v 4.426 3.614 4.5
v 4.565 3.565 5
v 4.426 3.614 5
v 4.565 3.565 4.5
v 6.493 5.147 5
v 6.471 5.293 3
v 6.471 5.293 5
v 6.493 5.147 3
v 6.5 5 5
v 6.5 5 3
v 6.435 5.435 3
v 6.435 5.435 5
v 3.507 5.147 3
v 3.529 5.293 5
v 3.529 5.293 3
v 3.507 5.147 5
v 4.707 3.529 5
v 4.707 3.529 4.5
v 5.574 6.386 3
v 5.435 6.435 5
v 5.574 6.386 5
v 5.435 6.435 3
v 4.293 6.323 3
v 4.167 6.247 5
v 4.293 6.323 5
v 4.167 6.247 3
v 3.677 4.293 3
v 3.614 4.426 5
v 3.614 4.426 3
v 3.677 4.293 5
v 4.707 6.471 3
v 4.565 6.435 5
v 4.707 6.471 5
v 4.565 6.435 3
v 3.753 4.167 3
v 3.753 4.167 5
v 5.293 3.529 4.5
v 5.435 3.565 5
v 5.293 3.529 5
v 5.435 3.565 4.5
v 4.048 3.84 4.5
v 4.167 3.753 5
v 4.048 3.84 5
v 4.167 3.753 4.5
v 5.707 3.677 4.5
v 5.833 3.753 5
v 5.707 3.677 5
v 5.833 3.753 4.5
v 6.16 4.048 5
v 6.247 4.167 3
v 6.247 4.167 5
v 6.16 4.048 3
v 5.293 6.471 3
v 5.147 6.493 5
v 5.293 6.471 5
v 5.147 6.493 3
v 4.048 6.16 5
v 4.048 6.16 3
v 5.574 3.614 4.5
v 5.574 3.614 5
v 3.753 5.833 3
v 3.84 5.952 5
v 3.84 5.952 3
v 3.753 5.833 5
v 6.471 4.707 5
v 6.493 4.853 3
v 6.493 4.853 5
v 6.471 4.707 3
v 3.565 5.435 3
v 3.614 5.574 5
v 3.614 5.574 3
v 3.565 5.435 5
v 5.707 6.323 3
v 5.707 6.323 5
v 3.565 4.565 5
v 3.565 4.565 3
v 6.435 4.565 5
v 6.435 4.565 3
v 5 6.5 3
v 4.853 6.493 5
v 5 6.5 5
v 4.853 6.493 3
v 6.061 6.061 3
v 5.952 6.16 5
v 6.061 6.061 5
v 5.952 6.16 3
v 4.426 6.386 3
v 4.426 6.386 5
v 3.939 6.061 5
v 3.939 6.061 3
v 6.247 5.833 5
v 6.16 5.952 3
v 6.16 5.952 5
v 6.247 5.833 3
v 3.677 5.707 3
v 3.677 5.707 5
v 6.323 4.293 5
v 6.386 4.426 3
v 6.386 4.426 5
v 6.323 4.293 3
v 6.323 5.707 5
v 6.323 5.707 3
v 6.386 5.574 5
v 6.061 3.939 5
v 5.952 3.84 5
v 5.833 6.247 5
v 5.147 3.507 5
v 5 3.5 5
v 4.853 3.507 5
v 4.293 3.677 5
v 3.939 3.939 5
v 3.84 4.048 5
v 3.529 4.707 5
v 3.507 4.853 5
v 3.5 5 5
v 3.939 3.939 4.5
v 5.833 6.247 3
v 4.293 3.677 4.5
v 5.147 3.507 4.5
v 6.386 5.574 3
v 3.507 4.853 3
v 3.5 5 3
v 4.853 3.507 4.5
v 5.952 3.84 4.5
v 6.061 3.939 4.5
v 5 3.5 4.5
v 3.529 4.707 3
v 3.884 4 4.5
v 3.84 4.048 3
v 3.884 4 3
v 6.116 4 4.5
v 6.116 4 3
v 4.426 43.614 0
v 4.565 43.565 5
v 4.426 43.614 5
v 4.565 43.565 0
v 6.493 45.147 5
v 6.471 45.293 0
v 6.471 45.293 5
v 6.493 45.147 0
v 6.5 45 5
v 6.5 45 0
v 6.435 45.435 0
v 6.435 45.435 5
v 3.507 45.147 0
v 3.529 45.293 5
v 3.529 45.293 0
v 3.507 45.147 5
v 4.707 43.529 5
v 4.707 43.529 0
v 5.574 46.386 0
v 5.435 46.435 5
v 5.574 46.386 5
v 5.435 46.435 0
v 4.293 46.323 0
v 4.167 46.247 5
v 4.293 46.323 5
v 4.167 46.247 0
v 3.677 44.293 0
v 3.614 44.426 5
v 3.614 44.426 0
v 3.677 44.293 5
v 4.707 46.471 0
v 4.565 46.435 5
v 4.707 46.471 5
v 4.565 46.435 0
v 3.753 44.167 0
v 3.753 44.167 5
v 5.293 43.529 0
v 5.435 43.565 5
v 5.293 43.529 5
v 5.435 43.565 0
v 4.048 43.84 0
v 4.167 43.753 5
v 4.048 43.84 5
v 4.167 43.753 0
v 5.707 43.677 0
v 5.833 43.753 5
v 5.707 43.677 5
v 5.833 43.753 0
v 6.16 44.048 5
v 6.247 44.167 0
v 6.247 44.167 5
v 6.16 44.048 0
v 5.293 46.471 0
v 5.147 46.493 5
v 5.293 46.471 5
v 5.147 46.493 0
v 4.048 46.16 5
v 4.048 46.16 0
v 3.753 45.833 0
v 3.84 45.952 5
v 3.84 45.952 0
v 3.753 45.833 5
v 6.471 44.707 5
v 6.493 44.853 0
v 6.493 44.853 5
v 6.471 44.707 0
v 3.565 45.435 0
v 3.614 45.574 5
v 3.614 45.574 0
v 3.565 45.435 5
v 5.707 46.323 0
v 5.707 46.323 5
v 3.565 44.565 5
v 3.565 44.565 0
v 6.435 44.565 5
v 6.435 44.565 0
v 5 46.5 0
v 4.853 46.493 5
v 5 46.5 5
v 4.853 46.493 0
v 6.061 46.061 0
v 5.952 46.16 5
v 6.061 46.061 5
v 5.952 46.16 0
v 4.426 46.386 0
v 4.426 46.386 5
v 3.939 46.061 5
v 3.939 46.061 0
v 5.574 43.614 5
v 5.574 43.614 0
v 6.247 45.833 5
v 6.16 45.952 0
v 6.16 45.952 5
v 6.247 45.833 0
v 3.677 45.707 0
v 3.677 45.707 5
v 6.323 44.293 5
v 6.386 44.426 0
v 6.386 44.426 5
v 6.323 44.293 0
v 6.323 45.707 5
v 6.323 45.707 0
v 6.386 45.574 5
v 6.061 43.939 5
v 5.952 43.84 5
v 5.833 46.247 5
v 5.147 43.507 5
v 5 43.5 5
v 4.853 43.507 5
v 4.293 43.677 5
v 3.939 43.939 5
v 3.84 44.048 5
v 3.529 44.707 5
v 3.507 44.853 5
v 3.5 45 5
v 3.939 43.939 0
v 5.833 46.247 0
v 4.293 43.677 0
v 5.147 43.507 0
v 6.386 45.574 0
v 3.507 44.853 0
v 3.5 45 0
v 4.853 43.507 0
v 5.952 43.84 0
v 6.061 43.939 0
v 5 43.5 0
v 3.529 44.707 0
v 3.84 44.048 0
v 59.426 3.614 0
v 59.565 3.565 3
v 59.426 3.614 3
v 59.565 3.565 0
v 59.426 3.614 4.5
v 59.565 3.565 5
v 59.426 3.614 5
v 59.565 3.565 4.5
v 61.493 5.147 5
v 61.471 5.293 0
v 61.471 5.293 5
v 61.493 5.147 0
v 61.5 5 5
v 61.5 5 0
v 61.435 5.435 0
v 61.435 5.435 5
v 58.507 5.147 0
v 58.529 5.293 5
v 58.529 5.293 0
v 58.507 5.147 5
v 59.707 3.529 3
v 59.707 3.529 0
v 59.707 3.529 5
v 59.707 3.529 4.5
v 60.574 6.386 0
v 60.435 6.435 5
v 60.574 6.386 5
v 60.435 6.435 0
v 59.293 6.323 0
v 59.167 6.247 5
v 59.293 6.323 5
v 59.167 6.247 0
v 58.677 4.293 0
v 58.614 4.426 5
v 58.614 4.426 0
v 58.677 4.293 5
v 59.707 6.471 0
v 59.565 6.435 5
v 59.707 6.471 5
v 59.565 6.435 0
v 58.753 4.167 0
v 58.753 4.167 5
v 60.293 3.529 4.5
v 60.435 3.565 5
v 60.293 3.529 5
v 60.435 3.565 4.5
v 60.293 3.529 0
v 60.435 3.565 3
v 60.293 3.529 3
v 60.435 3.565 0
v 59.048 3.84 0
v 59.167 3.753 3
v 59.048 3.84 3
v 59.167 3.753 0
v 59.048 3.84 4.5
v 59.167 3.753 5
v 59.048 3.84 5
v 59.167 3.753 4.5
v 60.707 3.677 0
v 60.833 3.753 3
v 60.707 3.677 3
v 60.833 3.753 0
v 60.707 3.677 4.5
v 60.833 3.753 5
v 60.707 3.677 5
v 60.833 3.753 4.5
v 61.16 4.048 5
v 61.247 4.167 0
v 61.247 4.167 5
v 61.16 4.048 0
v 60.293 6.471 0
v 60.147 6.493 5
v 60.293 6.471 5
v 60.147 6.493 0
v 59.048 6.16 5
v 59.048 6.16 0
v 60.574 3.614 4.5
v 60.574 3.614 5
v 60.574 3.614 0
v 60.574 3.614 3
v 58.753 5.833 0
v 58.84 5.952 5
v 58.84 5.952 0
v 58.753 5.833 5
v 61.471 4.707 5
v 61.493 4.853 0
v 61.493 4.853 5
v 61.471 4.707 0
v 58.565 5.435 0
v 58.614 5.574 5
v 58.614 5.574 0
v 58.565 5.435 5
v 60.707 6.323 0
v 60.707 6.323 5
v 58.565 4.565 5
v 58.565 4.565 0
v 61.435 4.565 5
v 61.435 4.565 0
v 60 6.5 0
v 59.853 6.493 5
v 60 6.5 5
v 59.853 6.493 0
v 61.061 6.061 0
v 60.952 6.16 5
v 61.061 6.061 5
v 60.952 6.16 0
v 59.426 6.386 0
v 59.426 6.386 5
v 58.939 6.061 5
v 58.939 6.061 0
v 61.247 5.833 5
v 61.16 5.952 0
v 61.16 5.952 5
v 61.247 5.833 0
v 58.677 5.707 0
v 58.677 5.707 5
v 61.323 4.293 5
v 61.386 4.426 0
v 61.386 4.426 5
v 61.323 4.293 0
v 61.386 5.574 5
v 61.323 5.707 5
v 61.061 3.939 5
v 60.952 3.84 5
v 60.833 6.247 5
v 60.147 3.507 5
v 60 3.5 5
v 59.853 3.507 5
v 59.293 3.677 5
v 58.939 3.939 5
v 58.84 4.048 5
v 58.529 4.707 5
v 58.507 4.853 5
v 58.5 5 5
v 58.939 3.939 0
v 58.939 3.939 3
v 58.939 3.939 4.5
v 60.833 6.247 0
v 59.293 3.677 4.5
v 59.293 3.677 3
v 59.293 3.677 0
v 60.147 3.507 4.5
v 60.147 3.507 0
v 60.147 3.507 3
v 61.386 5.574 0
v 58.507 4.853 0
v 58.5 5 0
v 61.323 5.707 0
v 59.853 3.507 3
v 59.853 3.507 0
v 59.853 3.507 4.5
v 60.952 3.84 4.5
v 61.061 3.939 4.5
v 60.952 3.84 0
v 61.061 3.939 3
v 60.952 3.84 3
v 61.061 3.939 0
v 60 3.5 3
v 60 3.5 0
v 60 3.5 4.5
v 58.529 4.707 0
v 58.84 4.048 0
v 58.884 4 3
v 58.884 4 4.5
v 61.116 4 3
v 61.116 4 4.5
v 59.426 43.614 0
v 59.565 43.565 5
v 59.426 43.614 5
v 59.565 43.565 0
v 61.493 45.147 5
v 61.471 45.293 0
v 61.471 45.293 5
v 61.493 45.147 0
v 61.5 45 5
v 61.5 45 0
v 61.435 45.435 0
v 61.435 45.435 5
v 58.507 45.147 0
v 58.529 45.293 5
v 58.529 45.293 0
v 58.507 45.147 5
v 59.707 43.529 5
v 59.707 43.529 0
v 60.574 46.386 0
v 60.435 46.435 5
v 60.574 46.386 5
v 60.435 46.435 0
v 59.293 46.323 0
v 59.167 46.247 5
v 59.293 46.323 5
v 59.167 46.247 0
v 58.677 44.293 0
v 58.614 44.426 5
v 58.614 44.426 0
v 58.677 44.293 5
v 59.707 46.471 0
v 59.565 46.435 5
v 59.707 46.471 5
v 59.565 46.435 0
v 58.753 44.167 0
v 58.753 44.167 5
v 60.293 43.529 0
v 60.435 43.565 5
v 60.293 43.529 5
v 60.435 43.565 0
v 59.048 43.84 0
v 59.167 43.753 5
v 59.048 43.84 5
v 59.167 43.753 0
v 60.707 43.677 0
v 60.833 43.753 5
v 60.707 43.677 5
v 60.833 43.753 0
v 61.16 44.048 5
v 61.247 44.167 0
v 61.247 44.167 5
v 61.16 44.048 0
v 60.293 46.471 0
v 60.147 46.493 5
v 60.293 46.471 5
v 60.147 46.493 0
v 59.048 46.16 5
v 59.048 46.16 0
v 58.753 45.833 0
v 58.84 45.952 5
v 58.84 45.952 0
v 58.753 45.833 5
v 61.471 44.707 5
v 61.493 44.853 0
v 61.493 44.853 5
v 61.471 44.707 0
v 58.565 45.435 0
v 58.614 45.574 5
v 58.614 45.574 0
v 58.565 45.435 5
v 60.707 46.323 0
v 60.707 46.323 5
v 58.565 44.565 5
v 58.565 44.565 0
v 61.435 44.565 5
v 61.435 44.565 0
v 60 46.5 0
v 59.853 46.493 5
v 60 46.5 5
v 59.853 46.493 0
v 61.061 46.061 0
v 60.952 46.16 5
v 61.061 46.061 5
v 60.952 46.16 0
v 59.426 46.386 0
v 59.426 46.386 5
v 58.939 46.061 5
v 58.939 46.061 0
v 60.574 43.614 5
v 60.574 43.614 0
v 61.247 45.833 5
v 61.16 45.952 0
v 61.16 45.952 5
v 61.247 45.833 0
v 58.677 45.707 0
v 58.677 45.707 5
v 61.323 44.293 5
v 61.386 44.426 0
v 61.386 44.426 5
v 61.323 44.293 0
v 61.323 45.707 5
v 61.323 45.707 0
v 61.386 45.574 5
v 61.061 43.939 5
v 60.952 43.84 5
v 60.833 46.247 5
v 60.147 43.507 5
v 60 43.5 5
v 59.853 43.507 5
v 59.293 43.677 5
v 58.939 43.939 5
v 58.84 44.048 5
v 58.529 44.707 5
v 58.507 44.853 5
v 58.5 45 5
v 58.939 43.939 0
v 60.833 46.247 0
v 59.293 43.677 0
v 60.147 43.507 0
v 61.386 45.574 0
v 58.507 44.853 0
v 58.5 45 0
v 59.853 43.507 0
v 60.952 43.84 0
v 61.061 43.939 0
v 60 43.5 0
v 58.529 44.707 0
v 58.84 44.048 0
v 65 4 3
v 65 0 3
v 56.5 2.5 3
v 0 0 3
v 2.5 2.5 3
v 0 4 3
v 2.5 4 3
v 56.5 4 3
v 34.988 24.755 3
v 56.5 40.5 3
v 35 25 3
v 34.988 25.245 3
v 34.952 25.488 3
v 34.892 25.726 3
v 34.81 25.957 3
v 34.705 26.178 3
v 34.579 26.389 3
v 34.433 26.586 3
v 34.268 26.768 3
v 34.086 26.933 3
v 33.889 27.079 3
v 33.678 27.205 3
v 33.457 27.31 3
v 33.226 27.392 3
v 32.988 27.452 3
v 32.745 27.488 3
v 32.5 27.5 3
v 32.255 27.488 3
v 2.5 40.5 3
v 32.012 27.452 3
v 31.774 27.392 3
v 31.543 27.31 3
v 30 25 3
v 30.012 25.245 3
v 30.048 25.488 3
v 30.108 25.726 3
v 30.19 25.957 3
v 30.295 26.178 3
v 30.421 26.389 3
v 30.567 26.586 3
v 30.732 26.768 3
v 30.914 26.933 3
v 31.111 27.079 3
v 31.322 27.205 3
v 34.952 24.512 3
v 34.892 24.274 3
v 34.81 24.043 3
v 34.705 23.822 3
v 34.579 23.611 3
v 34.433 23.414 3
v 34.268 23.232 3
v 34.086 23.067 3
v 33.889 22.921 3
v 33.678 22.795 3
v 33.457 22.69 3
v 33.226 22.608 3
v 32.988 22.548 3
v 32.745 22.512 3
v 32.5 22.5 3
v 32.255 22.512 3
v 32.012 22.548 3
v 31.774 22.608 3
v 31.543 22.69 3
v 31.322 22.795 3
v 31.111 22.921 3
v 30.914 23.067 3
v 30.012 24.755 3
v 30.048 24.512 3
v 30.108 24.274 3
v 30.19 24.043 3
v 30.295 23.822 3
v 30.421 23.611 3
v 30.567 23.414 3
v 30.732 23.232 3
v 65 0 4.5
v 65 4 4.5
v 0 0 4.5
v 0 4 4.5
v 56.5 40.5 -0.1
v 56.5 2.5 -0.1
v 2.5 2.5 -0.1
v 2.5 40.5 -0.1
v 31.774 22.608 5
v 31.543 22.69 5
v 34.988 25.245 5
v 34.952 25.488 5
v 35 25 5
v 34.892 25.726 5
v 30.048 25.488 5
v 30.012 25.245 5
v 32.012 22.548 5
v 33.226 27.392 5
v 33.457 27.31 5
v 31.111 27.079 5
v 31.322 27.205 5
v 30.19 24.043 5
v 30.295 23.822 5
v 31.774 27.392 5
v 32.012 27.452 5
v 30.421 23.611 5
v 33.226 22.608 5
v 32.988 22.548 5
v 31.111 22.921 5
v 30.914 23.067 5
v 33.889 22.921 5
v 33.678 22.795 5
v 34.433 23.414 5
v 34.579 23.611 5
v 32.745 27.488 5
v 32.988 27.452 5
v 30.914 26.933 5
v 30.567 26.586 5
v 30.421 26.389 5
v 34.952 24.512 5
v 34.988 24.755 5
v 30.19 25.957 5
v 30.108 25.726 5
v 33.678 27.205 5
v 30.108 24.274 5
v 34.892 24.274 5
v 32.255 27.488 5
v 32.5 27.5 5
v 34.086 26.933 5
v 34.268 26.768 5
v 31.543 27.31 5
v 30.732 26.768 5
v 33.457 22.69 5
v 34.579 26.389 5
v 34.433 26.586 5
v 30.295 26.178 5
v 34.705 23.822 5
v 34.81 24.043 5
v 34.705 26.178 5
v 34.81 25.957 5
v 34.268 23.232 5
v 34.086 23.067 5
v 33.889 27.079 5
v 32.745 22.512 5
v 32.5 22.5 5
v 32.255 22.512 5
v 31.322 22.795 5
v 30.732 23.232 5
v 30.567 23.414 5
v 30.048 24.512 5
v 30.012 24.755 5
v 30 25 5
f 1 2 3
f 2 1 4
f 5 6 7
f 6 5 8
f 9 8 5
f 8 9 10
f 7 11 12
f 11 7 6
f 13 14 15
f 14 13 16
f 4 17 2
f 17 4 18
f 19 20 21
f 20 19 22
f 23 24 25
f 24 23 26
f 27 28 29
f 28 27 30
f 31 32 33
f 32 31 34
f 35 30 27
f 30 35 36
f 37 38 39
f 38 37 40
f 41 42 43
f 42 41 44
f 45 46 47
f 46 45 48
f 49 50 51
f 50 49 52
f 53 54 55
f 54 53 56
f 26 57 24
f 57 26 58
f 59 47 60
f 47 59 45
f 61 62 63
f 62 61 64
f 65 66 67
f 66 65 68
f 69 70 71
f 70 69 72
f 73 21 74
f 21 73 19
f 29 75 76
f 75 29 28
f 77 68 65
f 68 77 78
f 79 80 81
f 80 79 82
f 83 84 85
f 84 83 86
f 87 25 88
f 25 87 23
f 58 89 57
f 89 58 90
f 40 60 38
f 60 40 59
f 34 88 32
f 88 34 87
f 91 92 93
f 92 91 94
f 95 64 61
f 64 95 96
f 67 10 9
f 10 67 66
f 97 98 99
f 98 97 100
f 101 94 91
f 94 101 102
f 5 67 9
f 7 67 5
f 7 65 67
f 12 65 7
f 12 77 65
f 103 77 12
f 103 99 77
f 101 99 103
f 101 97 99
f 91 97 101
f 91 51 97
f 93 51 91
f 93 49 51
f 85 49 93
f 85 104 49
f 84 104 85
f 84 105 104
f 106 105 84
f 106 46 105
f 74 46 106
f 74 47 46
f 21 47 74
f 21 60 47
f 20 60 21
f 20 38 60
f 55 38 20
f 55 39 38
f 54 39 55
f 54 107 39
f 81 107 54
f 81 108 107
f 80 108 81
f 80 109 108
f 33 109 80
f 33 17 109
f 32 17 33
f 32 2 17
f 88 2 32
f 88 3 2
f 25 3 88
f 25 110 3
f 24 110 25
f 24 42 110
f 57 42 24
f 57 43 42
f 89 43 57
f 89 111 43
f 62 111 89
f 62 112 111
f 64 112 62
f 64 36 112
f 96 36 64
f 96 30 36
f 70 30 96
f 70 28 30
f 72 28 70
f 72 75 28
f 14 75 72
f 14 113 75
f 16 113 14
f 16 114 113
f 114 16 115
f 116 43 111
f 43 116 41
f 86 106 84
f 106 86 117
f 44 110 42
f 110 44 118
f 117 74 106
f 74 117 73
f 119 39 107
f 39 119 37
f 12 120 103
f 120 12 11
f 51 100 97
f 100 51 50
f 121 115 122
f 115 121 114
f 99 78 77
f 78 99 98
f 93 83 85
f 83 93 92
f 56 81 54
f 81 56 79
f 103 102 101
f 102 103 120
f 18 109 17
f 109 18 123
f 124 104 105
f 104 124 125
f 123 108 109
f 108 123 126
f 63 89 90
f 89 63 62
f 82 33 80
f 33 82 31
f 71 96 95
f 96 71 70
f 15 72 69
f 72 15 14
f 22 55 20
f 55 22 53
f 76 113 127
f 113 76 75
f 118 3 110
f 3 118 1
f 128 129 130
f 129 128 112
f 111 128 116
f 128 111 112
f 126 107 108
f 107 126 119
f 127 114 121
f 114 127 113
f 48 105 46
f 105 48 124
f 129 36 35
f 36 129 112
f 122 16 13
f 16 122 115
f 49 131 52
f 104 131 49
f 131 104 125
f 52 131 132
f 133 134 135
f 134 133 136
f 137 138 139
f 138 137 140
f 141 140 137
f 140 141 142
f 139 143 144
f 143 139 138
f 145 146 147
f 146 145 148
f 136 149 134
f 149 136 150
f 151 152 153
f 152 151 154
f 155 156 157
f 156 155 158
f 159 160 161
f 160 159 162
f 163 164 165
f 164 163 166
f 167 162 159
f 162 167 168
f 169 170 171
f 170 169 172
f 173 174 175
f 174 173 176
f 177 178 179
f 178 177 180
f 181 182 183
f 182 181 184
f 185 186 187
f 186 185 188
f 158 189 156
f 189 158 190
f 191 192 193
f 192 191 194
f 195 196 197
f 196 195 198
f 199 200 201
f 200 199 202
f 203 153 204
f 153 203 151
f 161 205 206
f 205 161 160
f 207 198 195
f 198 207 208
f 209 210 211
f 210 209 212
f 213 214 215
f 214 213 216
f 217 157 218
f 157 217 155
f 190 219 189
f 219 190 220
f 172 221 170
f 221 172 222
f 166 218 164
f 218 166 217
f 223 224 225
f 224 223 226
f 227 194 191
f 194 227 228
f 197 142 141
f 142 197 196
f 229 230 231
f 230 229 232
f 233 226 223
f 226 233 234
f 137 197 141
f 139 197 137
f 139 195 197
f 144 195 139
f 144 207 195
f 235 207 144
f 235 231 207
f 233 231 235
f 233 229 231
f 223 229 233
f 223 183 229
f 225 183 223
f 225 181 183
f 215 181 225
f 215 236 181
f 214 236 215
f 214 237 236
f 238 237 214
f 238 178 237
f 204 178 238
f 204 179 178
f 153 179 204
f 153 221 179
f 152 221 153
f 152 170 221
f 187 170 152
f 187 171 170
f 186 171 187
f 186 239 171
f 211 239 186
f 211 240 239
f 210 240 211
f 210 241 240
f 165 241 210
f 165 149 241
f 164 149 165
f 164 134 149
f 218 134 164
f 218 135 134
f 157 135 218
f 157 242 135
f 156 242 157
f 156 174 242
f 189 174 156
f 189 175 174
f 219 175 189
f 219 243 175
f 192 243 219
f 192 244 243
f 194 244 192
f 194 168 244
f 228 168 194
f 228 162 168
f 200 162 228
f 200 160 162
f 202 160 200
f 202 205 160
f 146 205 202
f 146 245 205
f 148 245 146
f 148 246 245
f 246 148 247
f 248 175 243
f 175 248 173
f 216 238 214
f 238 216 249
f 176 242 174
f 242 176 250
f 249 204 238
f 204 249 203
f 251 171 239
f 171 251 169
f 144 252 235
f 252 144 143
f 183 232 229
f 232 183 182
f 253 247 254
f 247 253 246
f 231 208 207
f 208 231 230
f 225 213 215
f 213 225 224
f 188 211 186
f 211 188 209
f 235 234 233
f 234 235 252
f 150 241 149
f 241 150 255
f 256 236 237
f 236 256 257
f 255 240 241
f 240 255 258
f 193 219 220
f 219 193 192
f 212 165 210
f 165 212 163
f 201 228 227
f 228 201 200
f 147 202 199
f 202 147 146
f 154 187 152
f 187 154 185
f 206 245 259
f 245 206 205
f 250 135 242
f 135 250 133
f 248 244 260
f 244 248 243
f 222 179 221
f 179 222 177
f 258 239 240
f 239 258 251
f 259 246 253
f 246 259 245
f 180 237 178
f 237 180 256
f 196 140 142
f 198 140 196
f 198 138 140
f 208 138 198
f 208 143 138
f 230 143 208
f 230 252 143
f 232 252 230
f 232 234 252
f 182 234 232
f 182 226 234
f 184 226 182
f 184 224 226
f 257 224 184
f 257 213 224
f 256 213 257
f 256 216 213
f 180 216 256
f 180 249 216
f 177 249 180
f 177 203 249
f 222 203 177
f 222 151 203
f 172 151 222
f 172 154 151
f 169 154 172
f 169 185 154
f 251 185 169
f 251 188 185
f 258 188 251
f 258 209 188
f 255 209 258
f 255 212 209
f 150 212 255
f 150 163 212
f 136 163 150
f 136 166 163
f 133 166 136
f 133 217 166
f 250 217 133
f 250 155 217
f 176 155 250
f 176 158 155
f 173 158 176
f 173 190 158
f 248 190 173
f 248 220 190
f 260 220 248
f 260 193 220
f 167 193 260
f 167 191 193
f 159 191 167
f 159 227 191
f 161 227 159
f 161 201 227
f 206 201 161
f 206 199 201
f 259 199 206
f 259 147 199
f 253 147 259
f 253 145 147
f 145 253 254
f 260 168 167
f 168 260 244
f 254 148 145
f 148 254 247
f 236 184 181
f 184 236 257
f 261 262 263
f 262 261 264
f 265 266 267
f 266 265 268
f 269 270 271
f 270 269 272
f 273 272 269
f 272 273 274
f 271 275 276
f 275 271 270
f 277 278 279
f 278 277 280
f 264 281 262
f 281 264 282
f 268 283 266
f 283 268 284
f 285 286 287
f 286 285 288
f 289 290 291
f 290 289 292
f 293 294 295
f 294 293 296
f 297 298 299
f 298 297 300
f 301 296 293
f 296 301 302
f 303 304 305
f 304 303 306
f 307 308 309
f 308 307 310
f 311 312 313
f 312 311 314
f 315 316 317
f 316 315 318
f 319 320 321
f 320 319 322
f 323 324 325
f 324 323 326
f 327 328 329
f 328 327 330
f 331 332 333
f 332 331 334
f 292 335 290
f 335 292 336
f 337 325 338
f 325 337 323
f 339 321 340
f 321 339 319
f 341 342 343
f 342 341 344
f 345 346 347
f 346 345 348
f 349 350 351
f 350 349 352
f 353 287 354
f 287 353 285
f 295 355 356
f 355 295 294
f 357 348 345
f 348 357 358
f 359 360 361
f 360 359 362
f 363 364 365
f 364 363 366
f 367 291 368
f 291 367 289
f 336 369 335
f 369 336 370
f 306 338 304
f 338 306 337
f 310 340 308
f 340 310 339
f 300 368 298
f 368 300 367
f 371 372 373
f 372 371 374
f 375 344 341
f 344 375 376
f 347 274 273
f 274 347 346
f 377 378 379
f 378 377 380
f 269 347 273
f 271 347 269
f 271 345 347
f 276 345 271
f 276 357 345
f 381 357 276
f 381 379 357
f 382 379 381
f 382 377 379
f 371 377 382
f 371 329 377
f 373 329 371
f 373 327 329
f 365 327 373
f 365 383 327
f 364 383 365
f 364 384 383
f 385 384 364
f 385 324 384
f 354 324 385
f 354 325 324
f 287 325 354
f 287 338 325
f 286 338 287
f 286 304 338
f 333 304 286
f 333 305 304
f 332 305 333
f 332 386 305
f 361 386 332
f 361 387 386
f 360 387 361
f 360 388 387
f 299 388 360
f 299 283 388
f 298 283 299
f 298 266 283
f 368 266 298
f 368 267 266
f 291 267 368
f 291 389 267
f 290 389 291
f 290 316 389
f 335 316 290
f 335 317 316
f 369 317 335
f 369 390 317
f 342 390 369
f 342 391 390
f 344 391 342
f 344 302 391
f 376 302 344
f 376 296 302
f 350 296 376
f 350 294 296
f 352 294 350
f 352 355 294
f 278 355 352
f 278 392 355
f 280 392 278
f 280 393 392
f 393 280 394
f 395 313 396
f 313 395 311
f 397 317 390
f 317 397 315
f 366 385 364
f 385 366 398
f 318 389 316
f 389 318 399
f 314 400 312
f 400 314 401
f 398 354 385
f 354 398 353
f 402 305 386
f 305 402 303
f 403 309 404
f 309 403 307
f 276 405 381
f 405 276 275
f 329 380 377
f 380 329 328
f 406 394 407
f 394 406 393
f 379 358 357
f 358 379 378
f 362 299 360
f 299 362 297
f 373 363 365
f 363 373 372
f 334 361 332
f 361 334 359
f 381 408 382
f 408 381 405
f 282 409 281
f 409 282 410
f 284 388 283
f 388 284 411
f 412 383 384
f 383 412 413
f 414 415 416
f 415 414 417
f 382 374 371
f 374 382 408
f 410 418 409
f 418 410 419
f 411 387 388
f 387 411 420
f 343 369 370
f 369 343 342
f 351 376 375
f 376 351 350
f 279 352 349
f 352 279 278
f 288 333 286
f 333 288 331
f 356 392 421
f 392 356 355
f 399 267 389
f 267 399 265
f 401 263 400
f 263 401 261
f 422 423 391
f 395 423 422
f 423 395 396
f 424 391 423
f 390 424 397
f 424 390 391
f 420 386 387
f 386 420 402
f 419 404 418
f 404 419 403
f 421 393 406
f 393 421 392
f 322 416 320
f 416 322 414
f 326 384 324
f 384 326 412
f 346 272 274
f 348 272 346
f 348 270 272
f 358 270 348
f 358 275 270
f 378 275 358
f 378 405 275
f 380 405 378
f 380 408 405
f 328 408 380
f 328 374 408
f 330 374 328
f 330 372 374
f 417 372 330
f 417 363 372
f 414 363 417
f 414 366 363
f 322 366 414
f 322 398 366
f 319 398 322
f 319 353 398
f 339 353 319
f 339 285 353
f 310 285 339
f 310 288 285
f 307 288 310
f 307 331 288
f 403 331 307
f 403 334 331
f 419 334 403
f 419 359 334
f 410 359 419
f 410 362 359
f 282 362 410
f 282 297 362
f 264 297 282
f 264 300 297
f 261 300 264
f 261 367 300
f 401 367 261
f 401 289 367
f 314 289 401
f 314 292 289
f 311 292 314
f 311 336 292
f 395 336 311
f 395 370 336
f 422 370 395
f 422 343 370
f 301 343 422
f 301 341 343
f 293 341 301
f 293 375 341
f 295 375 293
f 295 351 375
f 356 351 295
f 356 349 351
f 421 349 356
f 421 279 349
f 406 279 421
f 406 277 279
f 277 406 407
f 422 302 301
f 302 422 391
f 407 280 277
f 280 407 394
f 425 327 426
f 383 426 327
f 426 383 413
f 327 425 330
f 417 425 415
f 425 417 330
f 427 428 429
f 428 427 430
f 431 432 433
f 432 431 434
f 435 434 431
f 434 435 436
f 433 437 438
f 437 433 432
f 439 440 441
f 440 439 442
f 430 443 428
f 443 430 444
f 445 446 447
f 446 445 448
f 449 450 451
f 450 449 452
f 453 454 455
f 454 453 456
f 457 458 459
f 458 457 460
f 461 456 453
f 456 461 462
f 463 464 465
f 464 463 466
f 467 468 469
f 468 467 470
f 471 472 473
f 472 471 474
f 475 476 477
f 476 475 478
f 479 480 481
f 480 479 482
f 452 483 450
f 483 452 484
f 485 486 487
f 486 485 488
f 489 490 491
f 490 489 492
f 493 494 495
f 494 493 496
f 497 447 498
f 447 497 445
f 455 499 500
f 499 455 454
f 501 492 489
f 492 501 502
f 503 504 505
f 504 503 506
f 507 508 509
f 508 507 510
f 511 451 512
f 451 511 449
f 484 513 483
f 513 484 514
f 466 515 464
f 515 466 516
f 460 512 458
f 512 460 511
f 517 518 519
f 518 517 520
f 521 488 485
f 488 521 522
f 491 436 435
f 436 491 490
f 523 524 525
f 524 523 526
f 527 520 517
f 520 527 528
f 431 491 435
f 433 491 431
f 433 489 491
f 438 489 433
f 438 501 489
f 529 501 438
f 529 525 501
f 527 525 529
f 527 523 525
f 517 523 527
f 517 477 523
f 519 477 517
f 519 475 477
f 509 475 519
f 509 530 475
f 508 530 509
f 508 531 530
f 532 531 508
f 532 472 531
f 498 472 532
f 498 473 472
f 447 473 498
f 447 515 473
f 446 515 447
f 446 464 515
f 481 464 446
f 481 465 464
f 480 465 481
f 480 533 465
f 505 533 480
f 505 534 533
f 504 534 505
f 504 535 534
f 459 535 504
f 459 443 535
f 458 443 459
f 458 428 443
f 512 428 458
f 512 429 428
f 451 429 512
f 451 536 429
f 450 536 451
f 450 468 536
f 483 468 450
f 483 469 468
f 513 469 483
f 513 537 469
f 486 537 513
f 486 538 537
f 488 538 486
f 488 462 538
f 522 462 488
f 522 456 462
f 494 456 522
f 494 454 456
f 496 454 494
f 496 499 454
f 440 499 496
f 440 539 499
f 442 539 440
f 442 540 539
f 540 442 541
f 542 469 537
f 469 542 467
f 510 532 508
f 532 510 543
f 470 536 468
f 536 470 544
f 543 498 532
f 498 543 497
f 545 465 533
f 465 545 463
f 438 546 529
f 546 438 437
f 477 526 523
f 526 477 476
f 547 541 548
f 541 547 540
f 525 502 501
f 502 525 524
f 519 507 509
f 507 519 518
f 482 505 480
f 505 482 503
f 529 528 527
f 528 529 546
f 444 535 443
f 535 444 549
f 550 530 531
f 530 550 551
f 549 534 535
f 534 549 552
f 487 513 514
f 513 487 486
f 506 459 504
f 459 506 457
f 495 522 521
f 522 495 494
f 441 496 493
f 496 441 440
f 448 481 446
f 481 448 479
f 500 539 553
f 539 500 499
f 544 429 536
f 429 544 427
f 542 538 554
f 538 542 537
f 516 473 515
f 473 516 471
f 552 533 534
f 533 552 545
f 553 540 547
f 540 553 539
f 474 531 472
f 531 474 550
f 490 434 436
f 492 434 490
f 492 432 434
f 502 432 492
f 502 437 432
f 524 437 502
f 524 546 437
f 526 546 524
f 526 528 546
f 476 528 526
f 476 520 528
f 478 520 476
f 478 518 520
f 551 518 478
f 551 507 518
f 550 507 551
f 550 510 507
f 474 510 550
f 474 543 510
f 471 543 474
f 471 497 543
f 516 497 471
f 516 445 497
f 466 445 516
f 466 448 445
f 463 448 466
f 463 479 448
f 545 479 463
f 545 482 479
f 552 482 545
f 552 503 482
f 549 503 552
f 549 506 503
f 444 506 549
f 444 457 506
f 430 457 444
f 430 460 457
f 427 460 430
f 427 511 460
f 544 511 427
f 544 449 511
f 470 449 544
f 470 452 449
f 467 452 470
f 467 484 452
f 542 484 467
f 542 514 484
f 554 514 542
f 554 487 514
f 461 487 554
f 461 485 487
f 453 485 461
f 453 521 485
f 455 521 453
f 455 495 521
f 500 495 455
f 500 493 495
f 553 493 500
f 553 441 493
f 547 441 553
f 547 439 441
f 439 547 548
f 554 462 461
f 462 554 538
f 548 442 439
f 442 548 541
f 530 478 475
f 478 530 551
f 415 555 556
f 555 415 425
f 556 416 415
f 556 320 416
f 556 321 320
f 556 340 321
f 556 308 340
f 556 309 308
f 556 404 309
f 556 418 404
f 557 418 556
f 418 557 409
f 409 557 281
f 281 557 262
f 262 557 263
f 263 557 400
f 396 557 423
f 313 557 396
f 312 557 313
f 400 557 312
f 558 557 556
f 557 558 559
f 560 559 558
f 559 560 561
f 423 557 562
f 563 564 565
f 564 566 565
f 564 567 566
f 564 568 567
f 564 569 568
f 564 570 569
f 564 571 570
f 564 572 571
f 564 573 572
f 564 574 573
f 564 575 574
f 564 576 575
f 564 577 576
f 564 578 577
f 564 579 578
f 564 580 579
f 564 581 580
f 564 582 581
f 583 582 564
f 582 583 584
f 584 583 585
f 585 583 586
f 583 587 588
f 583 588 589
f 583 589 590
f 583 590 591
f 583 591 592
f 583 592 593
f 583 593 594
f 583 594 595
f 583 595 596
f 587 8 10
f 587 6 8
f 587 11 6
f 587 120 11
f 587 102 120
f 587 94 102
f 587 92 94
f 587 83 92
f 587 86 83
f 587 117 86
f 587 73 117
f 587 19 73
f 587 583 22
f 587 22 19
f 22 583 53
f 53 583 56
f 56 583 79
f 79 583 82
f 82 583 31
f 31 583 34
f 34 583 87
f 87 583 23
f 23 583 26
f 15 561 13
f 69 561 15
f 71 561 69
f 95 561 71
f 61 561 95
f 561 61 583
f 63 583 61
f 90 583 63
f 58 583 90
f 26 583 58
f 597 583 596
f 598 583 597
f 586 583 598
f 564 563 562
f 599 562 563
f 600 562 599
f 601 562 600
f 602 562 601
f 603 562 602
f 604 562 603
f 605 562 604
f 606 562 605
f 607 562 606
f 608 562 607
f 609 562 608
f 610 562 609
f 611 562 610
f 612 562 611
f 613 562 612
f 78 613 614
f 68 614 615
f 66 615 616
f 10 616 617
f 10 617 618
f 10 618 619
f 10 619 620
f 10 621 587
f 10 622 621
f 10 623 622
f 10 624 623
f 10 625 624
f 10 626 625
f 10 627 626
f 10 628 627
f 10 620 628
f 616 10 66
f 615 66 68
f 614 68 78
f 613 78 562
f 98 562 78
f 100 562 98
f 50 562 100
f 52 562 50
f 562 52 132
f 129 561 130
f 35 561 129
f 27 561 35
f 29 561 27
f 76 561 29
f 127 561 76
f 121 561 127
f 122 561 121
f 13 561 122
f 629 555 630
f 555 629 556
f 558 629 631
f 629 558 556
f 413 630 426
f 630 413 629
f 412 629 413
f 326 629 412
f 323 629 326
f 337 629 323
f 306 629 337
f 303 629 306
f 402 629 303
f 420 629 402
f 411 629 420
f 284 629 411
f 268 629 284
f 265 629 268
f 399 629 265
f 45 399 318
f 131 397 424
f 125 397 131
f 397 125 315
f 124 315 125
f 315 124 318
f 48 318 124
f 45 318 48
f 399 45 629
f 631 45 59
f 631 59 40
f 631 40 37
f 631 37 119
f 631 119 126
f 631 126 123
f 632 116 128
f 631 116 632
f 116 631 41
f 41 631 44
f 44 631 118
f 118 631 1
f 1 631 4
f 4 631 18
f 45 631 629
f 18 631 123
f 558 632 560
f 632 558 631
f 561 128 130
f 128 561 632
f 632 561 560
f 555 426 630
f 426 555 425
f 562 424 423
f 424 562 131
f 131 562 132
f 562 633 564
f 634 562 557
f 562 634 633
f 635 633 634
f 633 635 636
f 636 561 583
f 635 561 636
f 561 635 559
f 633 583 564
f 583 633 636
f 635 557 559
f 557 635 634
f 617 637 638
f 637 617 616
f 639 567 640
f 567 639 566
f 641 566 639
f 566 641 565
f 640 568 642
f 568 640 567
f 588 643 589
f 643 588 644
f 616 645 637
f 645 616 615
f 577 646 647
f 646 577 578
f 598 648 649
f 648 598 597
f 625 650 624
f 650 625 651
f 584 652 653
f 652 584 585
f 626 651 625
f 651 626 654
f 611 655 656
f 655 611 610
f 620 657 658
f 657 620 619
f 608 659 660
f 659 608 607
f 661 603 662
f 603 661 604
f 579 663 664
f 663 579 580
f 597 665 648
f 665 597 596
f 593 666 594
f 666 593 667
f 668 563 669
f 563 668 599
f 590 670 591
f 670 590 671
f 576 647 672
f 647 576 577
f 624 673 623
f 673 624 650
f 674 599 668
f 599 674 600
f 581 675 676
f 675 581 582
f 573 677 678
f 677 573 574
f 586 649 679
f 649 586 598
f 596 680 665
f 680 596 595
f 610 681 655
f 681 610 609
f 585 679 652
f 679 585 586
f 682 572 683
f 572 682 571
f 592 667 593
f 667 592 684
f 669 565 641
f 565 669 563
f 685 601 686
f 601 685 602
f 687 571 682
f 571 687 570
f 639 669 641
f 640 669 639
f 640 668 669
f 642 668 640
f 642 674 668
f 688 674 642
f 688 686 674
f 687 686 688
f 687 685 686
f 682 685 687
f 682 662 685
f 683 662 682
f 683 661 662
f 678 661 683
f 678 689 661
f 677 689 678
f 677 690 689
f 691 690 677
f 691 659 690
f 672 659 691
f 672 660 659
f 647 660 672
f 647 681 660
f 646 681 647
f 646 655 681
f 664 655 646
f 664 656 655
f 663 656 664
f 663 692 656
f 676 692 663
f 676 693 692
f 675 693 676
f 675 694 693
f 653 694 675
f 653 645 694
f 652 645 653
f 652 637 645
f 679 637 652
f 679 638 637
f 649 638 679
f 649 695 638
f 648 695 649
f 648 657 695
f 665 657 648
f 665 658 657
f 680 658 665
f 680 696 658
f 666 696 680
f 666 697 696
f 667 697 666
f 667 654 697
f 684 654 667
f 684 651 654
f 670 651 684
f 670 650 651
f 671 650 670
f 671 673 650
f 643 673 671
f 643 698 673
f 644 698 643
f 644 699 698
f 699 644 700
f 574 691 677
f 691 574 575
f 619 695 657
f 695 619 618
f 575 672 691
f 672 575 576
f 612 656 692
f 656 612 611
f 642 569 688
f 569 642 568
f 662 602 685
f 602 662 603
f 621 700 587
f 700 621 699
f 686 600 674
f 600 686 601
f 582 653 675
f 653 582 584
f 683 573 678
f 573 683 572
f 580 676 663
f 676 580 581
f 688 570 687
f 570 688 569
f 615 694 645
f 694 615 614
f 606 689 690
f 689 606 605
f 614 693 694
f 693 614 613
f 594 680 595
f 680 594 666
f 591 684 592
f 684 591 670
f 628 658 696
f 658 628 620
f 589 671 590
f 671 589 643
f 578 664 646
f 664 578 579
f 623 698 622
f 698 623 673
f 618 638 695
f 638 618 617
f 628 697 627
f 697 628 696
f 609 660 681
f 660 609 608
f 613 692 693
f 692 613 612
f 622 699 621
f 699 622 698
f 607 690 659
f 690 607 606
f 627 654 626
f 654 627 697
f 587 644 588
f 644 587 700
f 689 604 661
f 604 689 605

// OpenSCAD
// STASYS Enclosure — LID (Top Half)
// OpenSCAD model for SLA/SLS 3D printing
// Print: flat on build plate (lid height), no supports
//
// Hardware BOM: see enclosure_BOM.md
//
// Material: PA12 SLS recommended
//

// ===============================
// PARAMETERS (must match base)
// ===============================
INNER_WIDTH = 60;
INNER_DEPTH = 45;
INNER_HEIGHT = 22;
WALL = 2.5;
BASE_HEIGHT = 8;
LID_HEIGHT = 4;

PICA_SPACING = 10.01;
PICA_SLOTS = 2;

SCREW_D = 3.0;
SCREW_HEAD_D = 6.0;
SCREW_CSINK = 1.5;
INSERT_D = 4.4;

GASKET_D = 1.0;
GASKET_W = 2.0;

BATTERY_L = 50;
BATTERY_W = 34;
VENT_D = 6.0;

$fn = 64;

// ===============================
// COMPUTED
// ===============================
OUTER_W = INNER_WIDTH + 2 * WALL;
OUTER_D = INNER_DEPTH + 2 * WALL;
PICA_BODY_W = PICA_SLOTS * PICA_SPACING + 4;

BOSS_INSET = 5;
boss_pos = [
    [BOSS_INSET, BOSS_INSET],
    [BOSS_INSET, OUTER_D - BOSS_INSET],
    [OUTER_W - BOSS_INSET, BOSS_INSET],
    [OUTER_W - BOSS_INSET, OUTER_D - BOSS_INSET]
];

// ===============================
// GASKET CHANNEL 2D (matches base)
// ===============================
module gasket_channel_2d() {
    difference() {
        square([OUTER_W, LID_HEIGHT]);
        offset(delta = -GASKET_D)
            square([OUTER_W, LID_HEIGHT]);
    }
    intersection() {
        difference() {
            offset(delta = -GASKET_D)
                square([OUTER_W, LID_HEIGHT]);
            offset(delta = -(GASKET_D + GASKET_W))
                square([OUTER_W, LID_HEIGHT]);
        }
        square([OUTER_W, LID_HEIGHT]);
    }
}

// ===============================
// LID PROFILE 2D
// ===============================
module lid_profile_2d() {
    difference() {
        // Picatinny body + main lid footprint
        translate([(OUTER_W - PICA_BODY_W)/2, 0])
            square([PICA_BODY_W, LID_HEIGHT]);
        square([OUTER_W, LID_HEIGHT]);

        // Screw counterbores (top surface)
        for (p = boss_pos)
            translate(p)
                circle(d = SCREW_HEAD_D + 0.3);

        // Vent port (center)
        translate([OUTER_W/2, OUTER_D/2])
            circle(d = VENT_D);
    }
}

// ===============================
// LID 3D
// ===============================
// Outer shell
linear_extrude(height = LID_HEIGHT)
    lid_profile_2d();

// Gasket channel on bottom face (complementary to base)
translate([0, 0, LID_HEIGHT - GASKET_D])
    linear_extrude(height = GASKET_D + 0.5)
        gasket_channel_2d();

// Screw through-holes
for (p = boss_pos)
    translate([p[0], p[1], 0])
        cylinder(d = SCREW_D, h = LID_HEIGHT + 1);

// Battery recess (bottom face — battery sits against PCB, lid clears it)
translate([WALL, WALL, -0.1])
    cube([BATTERY_L + 4, BATTERY_W + 4, LID_HEIGHT - GASKET_D + 0.1]);

// Vent membrane port (partial depth, to accept membrane disc)
translate([OUTER_W/2, OUTER_D/2, LID_HEIGHT - 2])
    cylinder(d = VENT_D - 1, h = 3);

echo("=== LID DIMENSIONS ===");
echo(str("Outer (W×D×H): ", OUTER_W, "×", OUTER_D, "×", LID_HEIGHT, " mm"));
echo(str("Battery recess: ", BATTERY_L+4, "×", BATTERY_W+4, "×", LID_HEIGHT - GASKET_D, " mm"));
echo(str("Vent port: Ø", VENT_D, " mm"));
